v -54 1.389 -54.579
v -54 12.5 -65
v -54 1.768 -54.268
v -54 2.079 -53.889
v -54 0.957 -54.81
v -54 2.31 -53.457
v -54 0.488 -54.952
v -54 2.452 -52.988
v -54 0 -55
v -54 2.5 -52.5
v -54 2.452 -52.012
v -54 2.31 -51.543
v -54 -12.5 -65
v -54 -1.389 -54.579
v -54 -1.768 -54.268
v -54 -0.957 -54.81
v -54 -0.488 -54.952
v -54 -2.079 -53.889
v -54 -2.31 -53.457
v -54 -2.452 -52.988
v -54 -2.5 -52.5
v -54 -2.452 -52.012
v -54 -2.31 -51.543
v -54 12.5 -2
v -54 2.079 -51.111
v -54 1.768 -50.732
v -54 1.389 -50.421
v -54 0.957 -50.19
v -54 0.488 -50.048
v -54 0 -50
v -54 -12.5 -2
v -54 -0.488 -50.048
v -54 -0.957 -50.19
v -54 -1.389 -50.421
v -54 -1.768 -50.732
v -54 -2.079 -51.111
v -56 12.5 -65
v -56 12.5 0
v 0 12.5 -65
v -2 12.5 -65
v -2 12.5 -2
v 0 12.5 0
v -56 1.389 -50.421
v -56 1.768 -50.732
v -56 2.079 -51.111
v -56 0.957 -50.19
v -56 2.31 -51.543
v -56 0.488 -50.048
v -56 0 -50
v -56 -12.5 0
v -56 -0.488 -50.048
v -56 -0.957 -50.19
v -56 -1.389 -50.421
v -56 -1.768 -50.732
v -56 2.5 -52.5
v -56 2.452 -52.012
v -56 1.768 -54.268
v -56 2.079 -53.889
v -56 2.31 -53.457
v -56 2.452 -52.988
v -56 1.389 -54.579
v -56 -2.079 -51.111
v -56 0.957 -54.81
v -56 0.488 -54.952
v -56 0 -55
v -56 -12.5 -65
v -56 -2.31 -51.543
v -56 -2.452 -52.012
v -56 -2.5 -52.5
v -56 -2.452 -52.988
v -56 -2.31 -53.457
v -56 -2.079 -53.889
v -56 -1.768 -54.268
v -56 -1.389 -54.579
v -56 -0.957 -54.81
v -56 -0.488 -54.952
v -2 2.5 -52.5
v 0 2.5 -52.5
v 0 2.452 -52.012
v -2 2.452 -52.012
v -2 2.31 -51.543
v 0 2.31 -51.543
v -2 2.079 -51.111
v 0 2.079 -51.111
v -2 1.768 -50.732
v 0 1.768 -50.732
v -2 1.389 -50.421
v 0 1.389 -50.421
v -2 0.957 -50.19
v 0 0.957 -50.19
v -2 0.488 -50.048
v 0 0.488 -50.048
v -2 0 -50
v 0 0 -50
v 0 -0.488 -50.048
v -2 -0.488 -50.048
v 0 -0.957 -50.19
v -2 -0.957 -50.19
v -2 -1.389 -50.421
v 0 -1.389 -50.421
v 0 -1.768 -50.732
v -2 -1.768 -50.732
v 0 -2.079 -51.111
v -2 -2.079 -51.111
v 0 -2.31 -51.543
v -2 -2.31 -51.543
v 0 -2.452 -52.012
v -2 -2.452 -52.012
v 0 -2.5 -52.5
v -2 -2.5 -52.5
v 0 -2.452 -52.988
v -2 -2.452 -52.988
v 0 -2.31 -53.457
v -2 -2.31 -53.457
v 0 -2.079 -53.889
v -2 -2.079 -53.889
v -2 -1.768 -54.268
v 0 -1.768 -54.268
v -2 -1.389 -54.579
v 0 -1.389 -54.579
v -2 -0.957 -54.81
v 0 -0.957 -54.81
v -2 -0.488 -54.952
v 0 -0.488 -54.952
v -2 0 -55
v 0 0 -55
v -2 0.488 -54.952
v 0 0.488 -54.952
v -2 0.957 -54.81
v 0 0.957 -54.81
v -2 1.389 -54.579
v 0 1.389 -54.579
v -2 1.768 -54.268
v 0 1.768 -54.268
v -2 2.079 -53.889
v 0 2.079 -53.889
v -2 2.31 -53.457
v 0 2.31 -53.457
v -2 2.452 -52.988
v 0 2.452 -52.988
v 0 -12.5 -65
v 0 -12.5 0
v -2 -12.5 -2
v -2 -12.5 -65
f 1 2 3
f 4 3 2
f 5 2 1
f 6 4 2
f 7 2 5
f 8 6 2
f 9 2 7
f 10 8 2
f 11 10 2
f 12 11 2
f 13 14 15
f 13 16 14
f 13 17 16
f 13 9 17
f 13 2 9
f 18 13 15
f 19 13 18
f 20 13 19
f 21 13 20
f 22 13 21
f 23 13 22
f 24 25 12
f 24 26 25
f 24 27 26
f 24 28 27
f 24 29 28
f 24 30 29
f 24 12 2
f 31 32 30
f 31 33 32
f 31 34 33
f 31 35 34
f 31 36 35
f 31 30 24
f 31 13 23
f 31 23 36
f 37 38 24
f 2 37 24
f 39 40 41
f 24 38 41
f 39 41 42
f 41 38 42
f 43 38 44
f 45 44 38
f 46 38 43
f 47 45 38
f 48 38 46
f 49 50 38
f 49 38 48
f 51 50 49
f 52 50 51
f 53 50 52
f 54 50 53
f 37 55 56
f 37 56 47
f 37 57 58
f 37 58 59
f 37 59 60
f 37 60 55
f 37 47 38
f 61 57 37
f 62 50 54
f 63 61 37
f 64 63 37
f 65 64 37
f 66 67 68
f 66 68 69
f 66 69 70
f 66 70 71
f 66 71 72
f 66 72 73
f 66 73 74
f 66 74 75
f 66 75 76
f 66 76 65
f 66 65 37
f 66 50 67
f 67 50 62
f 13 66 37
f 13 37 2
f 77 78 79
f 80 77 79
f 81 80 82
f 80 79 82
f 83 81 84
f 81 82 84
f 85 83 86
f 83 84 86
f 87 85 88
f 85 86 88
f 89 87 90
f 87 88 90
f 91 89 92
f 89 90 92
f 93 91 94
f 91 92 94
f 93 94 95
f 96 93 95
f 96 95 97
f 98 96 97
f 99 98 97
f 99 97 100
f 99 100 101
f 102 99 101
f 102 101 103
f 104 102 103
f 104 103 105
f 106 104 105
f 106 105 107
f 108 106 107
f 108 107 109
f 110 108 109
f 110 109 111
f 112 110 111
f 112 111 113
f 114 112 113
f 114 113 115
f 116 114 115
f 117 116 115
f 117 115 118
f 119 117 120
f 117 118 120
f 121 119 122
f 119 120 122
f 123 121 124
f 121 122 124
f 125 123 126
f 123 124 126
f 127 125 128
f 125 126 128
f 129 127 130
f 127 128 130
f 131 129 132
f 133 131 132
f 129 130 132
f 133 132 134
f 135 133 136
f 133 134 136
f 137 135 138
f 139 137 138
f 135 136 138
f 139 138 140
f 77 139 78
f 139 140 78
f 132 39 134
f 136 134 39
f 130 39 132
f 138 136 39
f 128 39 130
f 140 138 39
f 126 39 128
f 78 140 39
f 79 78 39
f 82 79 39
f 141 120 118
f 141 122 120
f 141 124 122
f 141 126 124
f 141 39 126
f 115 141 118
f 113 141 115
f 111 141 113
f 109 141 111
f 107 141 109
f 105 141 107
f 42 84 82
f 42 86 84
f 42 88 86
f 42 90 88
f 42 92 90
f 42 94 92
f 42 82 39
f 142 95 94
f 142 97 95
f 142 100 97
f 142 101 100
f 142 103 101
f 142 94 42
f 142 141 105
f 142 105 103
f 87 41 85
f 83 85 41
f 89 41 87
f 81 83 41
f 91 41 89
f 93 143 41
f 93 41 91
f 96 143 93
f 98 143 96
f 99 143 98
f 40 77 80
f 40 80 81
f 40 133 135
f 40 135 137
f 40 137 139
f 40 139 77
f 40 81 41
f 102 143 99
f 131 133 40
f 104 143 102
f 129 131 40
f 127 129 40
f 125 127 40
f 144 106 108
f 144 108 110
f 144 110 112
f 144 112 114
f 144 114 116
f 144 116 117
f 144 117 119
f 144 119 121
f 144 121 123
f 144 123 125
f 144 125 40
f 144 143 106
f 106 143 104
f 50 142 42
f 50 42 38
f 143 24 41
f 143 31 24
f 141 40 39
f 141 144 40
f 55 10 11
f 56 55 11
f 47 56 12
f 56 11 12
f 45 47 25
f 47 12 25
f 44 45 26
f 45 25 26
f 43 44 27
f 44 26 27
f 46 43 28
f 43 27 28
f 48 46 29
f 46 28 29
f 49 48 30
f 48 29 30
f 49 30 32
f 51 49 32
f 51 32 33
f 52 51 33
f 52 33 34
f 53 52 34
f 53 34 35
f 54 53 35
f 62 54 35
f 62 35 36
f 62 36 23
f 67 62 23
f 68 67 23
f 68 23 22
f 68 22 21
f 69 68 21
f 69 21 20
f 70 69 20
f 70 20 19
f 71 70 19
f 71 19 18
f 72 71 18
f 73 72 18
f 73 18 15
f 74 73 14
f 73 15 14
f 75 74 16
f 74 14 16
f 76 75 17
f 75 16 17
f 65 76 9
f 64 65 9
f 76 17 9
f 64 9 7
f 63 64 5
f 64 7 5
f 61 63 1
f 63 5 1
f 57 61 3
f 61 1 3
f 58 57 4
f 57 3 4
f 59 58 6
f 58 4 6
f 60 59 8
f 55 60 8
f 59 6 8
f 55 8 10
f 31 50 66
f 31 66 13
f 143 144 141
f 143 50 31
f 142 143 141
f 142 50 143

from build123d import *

# Parameters (mm, degrees)
F1_DEPTH      = 12.5
F2_R          = 2.5
F3_DEPTH      = 56.001
F3_DEPTH_BACK = 126


# Not quite as in the source:
# - an extrude ends at something that could not be found from the text; its depth is read off the source's solid


with BuildPart() as f1:
    # F0 (on Front) → F1 (new body, symmetric)
    with BuildSketch(Plane.XZ):
        Polygon((-2, -65), (0, -65), (0, 0), (-56, 0), (-56, -65), (-54, -65), (-54, -2), (-2, -2), align=None)
    extrude(amount=F1_DEPTH, both=True)

    # F2 (on Right) → F3 (cut, two sides)
    with BuildSketch(Plane.YZ) as f3_sk:
        with Locations((0, -52.5)):
            Circle(F2_R)
    extrude(amount=-F3_DEPTH, mode=Mode.SUBTRACT)
    extrude(f3_sk.sketch, amount=F3_DEPTH_BACK, mode=Mode.SUBTRACT)


solid = f1.part
